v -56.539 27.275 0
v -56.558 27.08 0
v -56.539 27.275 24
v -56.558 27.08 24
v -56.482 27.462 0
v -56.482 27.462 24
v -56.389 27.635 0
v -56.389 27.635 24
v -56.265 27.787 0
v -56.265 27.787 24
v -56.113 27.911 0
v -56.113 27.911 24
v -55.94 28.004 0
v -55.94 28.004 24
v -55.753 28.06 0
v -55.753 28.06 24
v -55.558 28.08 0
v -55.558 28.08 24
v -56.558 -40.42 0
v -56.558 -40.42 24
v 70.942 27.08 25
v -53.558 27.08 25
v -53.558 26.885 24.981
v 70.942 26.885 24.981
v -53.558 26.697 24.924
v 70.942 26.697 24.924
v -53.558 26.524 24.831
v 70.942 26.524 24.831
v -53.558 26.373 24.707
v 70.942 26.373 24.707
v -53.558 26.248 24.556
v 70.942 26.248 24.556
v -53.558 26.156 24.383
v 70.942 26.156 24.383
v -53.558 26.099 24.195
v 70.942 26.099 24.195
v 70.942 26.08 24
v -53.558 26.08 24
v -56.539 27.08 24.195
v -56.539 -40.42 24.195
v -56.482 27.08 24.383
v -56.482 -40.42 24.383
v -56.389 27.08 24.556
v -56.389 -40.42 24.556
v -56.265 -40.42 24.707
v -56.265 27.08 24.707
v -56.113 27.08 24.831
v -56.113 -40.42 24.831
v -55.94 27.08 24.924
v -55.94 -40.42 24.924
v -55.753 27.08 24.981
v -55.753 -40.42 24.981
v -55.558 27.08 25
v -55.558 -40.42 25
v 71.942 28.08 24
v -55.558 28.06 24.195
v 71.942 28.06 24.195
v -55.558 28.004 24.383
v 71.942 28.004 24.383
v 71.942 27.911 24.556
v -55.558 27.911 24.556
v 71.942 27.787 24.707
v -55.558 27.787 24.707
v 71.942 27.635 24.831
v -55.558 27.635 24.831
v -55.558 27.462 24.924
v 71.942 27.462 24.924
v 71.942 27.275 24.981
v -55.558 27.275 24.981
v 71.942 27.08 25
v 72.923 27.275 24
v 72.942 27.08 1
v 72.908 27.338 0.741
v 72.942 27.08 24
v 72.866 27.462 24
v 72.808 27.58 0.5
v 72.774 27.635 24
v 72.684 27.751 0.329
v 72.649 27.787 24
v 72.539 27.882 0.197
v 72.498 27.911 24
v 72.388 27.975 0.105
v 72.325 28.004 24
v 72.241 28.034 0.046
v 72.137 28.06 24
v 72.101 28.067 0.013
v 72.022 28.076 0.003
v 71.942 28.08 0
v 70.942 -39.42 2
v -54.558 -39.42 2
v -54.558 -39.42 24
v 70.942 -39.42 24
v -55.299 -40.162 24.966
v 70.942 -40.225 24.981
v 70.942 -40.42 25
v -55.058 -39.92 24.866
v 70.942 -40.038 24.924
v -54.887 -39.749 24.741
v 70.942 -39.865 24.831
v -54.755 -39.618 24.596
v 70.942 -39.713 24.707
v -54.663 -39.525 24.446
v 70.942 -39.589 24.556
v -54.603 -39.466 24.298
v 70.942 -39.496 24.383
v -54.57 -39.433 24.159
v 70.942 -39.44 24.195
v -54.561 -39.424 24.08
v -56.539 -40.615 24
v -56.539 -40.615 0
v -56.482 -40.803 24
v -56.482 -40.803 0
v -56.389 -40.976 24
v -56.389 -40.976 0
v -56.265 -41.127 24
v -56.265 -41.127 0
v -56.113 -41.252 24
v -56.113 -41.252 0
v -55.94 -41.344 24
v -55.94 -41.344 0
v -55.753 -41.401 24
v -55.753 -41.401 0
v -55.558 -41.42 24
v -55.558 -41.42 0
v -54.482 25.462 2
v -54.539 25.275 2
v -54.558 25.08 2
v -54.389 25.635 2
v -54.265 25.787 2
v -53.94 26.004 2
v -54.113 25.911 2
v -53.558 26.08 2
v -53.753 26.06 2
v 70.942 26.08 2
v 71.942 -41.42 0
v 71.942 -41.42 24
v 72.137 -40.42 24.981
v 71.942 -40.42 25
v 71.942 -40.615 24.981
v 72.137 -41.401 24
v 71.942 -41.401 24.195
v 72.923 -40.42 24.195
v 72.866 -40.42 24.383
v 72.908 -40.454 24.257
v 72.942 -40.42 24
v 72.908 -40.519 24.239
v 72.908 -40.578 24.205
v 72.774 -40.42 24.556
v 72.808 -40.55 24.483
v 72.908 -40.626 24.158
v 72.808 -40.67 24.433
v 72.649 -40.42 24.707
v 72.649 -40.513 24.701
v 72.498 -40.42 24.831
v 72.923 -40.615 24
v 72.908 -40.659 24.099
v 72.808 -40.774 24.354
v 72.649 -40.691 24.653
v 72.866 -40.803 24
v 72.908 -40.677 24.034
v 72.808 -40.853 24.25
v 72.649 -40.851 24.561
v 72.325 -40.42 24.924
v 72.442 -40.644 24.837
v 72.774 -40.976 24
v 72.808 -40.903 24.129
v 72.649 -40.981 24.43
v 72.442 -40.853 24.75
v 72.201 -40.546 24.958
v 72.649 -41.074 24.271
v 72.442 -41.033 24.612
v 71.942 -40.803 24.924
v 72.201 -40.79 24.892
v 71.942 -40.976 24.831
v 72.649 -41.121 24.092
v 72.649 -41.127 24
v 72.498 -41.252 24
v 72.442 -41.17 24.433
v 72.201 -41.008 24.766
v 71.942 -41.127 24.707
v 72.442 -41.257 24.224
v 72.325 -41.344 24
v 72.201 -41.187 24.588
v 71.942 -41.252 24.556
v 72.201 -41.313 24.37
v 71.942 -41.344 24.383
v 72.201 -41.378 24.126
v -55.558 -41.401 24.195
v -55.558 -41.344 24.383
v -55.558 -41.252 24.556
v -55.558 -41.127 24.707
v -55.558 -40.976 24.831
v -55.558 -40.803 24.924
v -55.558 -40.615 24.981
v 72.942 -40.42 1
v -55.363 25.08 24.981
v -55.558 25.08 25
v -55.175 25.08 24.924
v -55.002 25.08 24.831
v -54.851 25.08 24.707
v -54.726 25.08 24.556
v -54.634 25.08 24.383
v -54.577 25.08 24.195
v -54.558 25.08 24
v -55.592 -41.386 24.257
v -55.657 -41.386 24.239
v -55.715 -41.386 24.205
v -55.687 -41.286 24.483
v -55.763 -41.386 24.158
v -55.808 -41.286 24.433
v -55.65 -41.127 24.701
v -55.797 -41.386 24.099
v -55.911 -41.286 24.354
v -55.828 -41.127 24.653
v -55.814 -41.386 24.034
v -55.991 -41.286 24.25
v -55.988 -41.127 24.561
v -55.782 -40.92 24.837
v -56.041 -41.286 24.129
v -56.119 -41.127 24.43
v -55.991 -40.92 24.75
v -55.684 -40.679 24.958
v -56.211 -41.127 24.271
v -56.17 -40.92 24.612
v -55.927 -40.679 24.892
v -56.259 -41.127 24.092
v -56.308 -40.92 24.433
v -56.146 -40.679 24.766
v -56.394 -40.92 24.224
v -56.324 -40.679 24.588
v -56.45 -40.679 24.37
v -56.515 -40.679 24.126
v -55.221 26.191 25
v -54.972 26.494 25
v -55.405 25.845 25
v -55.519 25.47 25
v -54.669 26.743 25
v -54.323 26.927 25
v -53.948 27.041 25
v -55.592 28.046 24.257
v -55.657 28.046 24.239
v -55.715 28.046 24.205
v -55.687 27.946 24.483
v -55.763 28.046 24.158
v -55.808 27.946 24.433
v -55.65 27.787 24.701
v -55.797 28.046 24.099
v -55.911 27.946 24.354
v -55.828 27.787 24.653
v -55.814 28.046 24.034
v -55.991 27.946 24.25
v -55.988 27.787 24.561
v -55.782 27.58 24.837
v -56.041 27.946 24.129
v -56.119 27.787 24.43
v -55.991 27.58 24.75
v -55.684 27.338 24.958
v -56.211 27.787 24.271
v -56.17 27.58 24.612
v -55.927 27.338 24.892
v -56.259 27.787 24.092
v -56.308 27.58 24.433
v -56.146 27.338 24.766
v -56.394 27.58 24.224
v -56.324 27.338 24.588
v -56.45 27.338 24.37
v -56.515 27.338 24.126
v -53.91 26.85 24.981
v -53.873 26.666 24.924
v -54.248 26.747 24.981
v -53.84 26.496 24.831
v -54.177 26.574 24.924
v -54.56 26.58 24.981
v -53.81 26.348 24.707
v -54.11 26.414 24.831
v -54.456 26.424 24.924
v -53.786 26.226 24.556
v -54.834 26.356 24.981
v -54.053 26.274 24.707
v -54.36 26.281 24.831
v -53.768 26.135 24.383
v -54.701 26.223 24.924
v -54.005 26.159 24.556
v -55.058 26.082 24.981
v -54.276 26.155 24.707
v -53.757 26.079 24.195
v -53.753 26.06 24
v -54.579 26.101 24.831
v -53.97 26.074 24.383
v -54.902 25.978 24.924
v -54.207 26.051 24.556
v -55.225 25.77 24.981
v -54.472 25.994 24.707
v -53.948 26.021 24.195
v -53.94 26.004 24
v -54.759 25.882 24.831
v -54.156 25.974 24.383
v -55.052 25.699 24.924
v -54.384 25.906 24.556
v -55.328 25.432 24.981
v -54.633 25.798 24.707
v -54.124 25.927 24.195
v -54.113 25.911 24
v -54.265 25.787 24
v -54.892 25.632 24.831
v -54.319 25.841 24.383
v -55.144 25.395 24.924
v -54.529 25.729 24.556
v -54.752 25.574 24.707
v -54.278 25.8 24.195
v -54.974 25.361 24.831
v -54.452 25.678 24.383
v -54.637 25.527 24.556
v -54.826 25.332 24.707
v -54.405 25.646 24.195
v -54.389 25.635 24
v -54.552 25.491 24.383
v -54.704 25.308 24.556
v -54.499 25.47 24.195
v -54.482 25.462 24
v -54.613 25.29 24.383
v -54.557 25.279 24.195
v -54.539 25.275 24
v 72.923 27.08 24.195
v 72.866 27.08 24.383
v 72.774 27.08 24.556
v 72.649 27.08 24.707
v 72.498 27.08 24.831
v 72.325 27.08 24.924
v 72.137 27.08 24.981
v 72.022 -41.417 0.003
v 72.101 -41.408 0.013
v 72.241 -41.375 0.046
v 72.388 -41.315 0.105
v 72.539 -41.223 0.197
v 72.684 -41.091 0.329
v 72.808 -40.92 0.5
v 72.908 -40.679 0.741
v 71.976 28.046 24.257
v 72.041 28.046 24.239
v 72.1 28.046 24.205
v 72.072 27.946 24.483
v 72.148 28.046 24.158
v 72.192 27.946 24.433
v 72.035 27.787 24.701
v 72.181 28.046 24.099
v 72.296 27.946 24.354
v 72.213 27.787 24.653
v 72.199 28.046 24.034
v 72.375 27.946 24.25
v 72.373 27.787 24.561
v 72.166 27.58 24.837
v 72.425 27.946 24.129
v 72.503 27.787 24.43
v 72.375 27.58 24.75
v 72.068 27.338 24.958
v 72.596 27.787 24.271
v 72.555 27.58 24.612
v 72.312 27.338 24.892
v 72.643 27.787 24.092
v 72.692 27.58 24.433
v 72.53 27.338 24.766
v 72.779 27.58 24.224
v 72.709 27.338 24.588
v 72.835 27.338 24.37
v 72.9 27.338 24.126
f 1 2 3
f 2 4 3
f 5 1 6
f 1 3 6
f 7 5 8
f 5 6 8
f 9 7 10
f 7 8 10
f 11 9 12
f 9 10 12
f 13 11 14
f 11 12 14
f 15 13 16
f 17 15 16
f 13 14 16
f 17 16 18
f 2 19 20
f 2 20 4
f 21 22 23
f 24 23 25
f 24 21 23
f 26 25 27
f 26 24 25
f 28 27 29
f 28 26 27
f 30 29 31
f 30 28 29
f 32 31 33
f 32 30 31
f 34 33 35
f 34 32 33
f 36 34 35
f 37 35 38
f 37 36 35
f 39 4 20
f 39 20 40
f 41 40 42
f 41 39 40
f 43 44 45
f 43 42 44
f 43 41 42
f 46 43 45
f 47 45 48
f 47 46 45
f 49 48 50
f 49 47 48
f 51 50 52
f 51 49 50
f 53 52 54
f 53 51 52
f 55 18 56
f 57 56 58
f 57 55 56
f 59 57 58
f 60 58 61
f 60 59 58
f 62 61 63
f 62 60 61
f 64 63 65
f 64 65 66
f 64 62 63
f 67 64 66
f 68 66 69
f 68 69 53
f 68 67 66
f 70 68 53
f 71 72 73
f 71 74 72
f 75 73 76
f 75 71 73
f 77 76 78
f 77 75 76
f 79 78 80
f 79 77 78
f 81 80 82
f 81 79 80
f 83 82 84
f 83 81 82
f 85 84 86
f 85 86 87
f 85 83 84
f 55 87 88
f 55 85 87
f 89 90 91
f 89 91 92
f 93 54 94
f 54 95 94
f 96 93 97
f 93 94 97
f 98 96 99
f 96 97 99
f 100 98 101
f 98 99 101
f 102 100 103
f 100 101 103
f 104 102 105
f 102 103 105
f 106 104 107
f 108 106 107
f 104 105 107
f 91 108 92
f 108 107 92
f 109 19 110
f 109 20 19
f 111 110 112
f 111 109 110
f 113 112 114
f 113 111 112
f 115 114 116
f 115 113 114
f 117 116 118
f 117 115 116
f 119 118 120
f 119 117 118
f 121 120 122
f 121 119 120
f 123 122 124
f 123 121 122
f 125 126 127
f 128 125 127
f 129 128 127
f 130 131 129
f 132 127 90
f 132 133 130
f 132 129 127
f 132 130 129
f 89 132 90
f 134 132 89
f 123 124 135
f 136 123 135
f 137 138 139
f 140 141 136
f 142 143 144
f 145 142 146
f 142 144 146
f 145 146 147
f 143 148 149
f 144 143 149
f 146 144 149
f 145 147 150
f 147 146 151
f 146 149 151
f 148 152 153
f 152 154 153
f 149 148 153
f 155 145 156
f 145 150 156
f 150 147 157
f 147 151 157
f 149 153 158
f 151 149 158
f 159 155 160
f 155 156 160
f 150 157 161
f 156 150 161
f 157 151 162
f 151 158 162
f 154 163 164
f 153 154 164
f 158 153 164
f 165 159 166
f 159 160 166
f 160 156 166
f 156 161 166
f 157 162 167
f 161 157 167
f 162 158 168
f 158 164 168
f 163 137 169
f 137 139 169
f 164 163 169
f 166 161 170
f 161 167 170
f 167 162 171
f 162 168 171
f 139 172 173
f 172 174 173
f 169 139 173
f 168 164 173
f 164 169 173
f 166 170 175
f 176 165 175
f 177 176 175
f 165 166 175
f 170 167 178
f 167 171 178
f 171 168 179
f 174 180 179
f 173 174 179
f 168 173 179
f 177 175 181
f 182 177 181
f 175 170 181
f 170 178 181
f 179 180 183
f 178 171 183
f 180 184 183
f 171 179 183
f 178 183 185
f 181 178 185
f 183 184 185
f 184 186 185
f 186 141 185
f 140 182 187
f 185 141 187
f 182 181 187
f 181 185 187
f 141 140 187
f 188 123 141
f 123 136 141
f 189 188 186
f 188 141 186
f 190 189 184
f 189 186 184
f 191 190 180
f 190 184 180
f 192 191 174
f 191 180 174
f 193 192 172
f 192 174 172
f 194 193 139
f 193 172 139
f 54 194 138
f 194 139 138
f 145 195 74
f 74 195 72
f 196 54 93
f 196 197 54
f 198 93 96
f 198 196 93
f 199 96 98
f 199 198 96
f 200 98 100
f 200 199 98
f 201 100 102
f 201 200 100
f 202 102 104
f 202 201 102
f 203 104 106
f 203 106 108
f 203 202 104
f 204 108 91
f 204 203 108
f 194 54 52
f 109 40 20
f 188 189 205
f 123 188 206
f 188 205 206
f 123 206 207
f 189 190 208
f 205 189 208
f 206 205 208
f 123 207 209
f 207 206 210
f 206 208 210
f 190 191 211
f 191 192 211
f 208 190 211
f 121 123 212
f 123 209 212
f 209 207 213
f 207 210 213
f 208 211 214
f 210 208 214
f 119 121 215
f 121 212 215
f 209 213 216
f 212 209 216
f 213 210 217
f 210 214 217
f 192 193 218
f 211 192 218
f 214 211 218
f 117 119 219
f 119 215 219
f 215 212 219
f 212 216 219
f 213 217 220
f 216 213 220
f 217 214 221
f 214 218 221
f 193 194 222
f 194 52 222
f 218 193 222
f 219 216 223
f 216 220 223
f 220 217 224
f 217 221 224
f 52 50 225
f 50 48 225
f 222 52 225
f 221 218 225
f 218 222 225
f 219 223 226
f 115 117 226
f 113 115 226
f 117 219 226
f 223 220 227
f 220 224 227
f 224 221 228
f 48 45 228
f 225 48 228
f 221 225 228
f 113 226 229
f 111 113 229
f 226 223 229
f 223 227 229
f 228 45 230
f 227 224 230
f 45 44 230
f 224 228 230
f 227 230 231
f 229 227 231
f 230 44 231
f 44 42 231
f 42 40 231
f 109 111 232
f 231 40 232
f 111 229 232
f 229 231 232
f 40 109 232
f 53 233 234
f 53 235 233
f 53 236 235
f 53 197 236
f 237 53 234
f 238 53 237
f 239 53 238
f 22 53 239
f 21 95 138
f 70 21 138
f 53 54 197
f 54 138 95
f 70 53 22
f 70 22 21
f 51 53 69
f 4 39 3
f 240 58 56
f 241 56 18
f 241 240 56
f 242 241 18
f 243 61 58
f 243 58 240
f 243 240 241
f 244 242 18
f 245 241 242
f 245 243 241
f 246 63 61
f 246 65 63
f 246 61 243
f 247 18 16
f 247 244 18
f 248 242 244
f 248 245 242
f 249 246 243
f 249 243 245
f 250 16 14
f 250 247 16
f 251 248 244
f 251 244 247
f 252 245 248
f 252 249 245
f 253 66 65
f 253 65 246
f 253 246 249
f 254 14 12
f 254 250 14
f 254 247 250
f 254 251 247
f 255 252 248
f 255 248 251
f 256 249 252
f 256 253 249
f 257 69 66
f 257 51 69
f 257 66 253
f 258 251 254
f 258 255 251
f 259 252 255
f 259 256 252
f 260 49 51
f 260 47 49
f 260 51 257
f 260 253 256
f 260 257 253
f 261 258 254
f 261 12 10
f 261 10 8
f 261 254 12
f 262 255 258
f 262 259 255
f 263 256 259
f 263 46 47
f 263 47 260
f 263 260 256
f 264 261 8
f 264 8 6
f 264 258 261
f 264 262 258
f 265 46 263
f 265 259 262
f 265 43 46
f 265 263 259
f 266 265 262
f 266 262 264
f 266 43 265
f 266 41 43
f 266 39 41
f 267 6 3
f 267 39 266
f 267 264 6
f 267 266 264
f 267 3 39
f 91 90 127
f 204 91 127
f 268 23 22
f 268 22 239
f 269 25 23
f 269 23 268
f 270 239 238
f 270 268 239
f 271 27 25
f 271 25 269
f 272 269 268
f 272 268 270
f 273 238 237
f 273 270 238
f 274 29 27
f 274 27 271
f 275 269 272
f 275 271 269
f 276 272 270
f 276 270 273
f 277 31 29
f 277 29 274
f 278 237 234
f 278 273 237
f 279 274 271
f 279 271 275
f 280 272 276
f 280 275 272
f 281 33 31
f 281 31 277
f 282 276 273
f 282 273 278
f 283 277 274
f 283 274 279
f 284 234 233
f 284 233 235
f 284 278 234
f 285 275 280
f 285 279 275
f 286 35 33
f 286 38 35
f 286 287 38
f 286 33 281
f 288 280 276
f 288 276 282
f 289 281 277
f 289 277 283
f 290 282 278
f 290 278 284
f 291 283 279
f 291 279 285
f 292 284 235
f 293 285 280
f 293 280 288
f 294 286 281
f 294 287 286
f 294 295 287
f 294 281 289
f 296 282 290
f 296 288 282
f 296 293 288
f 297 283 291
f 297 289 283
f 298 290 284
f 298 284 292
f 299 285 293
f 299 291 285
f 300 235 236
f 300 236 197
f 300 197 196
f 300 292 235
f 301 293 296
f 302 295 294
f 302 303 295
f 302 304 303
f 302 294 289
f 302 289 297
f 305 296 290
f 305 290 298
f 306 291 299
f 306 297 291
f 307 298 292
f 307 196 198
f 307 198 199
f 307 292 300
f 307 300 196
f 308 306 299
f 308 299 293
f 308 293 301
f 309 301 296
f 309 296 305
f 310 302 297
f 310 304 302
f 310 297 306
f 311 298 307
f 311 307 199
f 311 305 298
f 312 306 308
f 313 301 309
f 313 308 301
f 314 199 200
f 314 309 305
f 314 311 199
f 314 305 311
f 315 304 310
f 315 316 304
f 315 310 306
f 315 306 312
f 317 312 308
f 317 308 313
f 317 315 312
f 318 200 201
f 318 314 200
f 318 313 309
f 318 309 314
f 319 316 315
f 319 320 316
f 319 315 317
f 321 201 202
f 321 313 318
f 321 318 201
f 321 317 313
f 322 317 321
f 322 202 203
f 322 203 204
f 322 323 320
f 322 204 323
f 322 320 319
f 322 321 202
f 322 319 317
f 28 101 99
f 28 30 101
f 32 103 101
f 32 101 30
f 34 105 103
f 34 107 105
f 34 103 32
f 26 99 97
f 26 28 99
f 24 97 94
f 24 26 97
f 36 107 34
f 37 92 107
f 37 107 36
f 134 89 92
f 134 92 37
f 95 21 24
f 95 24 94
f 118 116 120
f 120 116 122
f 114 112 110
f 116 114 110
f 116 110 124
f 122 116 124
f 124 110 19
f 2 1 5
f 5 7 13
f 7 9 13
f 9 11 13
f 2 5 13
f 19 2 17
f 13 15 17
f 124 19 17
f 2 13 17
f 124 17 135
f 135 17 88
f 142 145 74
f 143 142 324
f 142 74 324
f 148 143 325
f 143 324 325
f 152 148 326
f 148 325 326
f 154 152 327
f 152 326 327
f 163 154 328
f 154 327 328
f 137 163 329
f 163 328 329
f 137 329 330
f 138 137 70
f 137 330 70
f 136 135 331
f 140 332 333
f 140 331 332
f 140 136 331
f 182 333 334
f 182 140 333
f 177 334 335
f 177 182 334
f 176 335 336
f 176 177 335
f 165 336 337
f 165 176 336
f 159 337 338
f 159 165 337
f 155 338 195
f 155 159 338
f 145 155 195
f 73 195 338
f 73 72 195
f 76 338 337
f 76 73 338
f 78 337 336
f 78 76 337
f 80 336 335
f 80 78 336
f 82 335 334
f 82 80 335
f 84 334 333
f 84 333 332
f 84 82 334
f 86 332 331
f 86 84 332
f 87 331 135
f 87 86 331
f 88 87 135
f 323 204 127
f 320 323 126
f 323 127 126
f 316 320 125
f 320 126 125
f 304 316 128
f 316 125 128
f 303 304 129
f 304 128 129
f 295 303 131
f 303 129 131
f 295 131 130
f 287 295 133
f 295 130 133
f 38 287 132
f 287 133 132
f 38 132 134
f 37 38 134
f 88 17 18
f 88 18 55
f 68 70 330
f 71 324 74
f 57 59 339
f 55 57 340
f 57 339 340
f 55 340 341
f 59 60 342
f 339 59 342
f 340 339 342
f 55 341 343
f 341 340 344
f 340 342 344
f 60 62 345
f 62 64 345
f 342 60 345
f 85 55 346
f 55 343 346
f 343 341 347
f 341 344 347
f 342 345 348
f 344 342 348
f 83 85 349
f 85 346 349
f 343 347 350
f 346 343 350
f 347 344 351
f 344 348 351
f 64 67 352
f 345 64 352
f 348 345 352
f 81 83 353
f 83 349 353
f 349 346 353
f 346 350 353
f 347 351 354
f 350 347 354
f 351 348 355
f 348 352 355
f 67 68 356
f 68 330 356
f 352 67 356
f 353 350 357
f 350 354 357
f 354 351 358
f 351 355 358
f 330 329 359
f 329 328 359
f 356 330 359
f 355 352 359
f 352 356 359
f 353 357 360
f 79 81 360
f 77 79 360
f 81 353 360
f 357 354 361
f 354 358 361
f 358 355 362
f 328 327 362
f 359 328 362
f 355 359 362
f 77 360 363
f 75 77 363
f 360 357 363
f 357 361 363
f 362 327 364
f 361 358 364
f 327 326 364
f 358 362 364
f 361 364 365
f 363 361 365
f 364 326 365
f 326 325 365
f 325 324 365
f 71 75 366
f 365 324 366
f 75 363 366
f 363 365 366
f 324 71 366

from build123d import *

# Parameters (mm, degrees)
F0_W     = 129.5
F0_H     = 69.5
F1_DEPTH = 25
F2_T     = -2
F3_R     = 0.99999


# Not quite as in the source:
# - a fillet or chamfer is up to 0.001 mm smaller than in the source, because OpenCascade refuses the exact size


with BuildPart() as f1:
    # F0 (on Top) → F1 (new body)
    with BuildSketch(Plane.XY):
        with Locations((8.1922735609, -6.6703366488)):
            Rectangle(F0_W, F0_H)
    extrude(amount=F1_DEPTH)

    # F2
    f2_openings = [f1.faces().sort_by_distance(p)[0] for p in [
        (8.192274, -6.670337, 25),
    ]]
    offset(amount=F2_T, openings=f2_openings)

    # F3 (radius 1 in the source; OpenCascade refuses exactly that, so slightly less here)
    f3_edges = [f1.edges().sort_by_distance(p)[0] for p in [
        (8.192274, 26.079663, 25),
        (-56.557726, -6.670337, 25),
        (-54.557726, -6.670337, 25),
        (8.192274, -41.420337, 25),
        (72.942274, -6.670337, 0),
        (72.942274, -6.670337, 25),
        (8.192274, -39.420337, 25),
        (8.192274, 28.079663, 25),
        (72.942274, 28.079663, 12.5),
        (-56.557726, 28.079663, 12.5),
        (-56.557726, -41.420337, 12.5),
        (-54.557726, 26.079663, 13.5),
        (72.942274, -41.420337, 12.5),
    ]]
    fillet(f3_edges, radius=F3_R)


solid = f1.part
